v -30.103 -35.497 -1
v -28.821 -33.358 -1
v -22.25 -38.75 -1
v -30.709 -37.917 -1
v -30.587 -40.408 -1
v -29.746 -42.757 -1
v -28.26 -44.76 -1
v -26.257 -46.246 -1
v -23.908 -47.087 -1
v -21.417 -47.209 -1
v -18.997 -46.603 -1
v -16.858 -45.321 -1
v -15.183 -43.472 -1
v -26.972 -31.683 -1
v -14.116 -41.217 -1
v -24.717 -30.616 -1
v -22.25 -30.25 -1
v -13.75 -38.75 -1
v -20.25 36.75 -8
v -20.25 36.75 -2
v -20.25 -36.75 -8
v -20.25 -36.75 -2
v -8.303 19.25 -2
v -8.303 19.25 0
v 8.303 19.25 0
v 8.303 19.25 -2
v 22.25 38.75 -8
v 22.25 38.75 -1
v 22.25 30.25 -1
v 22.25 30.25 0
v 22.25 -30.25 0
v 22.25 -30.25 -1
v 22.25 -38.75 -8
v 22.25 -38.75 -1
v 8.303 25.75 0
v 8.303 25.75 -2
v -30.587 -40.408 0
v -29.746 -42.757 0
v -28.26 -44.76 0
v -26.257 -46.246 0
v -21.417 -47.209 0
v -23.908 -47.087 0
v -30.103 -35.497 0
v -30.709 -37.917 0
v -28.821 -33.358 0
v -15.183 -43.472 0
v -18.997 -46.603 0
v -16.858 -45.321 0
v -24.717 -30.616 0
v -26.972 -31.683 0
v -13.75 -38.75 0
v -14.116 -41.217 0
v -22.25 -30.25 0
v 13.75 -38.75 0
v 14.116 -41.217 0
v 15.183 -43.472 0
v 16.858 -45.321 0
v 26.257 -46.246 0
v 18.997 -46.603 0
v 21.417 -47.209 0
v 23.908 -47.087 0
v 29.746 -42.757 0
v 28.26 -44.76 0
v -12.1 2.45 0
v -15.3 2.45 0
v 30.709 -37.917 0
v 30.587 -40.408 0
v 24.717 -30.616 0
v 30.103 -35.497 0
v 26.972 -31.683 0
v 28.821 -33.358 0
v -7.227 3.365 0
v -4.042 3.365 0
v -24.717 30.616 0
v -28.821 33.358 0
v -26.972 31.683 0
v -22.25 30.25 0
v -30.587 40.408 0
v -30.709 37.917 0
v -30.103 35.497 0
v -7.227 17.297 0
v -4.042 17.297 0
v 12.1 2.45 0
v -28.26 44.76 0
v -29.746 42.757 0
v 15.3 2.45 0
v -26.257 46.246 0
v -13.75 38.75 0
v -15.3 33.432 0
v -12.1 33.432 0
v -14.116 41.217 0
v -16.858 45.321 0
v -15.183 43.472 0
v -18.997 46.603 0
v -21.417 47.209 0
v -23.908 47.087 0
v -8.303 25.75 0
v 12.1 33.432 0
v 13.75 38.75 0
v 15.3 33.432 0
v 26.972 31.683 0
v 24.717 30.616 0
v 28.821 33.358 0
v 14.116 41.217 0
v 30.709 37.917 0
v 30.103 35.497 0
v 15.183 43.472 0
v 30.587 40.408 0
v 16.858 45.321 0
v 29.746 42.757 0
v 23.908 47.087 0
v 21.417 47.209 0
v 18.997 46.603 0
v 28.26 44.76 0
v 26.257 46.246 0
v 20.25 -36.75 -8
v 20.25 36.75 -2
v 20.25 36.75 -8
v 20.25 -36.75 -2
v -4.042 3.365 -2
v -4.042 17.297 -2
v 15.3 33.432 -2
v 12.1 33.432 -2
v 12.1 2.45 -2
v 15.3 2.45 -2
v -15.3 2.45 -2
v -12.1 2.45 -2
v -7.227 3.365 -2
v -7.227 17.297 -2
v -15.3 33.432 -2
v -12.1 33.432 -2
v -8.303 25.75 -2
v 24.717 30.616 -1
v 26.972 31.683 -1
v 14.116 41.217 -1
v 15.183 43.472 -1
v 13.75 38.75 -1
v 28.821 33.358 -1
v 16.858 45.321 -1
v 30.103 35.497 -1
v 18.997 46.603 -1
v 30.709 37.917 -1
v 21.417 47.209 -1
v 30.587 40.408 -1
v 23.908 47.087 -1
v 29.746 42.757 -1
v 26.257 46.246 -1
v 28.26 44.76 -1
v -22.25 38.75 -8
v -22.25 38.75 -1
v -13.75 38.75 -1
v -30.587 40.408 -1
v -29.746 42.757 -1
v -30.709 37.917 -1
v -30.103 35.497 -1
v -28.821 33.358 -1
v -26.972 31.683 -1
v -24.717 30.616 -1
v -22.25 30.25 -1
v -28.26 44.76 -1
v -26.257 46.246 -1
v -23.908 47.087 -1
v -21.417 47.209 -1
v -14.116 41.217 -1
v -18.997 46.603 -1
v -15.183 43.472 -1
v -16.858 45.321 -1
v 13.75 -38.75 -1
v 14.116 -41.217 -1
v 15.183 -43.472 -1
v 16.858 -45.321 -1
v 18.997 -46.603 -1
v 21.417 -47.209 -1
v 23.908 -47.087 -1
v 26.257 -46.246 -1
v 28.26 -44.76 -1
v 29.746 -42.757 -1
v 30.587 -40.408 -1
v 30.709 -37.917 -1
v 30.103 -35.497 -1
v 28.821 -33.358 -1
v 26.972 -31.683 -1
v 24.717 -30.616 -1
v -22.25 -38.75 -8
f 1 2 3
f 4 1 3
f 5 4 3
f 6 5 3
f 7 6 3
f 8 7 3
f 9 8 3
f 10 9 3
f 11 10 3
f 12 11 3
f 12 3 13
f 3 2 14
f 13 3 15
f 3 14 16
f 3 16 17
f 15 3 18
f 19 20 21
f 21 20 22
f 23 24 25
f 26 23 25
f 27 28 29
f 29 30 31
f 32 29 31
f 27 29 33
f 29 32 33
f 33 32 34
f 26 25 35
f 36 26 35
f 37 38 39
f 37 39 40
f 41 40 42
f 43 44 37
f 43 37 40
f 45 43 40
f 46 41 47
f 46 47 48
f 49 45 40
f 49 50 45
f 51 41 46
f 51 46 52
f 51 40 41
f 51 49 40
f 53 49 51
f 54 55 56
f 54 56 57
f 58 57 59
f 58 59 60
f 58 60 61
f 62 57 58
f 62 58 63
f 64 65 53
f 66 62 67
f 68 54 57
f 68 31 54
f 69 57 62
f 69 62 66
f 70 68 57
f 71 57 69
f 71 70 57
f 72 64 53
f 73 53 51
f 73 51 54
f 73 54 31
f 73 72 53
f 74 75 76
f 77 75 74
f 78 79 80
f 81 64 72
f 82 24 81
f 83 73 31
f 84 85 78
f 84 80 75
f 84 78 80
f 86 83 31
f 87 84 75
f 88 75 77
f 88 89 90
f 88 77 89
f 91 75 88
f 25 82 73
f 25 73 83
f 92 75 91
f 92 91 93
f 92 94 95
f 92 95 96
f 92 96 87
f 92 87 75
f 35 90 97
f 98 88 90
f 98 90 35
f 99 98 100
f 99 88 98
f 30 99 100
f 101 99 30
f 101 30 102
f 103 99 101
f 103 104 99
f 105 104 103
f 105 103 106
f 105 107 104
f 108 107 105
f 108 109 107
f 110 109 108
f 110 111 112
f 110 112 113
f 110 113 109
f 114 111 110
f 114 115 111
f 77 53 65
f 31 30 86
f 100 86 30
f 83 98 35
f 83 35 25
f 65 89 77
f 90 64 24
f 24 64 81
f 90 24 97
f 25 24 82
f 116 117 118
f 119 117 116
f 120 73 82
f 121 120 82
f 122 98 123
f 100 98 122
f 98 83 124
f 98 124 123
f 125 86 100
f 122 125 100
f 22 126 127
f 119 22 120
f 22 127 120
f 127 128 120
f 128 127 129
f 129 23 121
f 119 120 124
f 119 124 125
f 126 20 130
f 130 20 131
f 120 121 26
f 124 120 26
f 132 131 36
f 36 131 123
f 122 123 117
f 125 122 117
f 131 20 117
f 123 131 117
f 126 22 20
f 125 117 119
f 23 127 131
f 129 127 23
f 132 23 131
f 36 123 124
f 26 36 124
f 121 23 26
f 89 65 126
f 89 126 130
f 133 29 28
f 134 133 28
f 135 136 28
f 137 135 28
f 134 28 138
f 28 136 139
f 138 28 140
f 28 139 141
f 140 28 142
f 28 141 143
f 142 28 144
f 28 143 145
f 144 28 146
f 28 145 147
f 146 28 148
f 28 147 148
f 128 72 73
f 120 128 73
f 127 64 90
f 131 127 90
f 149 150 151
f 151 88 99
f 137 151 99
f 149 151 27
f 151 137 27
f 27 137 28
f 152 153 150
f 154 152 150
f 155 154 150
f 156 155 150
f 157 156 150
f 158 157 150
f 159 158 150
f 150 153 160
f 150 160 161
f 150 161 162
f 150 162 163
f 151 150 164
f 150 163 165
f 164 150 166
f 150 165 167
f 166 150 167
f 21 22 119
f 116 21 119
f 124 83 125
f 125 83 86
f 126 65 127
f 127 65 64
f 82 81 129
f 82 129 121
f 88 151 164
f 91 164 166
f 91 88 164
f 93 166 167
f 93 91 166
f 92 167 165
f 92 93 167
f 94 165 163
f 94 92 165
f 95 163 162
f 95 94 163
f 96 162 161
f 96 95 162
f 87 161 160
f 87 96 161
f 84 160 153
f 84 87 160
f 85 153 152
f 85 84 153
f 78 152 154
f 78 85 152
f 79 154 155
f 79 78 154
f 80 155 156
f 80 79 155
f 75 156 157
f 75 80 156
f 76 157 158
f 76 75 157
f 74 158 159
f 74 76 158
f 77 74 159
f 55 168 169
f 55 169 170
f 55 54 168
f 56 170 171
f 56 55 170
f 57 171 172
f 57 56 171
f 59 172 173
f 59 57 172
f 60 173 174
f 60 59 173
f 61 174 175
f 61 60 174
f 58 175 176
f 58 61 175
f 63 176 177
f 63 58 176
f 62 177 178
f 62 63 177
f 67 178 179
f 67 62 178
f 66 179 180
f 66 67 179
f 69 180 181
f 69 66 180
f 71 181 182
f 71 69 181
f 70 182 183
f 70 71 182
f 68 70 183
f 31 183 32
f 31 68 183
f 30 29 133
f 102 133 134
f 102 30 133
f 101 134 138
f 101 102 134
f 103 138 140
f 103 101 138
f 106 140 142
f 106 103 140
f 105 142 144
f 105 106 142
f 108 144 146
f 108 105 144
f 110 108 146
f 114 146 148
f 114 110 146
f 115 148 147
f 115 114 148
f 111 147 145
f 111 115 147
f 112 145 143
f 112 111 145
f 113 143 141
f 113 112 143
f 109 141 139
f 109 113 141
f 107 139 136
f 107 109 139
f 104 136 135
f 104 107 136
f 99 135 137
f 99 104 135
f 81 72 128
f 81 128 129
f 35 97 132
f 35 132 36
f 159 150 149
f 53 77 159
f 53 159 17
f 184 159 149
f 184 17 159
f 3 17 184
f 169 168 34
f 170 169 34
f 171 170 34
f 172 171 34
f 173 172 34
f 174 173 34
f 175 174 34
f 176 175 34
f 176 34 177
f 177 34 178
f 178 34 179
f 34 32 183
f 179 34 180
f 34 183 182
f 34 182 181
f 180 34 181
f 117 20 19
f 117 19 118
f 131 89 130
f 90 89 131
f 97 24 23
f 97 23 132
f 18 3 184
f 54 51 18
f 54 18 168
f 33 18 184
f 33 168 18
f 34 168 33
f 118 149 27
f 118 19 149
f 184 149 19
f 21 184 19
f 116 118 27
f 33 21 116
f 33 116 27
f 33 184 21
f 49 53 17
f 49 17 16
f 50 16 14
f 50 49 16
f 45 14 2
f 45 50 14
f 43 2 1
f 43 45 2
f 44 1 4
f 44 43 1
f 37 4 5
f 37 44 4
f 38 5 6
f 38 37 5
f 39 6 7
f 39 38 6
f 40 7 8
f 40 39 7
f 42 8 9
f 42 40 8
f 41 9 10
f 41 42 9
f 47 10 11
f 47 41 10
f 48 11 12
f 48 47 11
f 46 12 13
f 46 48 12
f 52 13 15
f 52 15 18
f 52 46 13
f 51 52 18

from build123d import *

# Parameters (mm, degrees)
F0_W     = 44.5
F0_H     = 77.5
F0_W_2   = 40.5
F0_H_2   = 73.5
F0_W_3   = 34.2
F0_H_3   = 33.5
F0_W_4   = 3.2
F0_H_4   = 30.9815835953
F0_W_5   = 3.1855669804
F0_H_5   = 13.9315482229
F0_W_6   = 16.6057739407
F0_H_6   = 6.5
F1_DEPTH = 2
F2_W     = 44.5
F2_H     = 77.5
F2_W_2   = 40.5
F2_H_2   = 73.5
F3_DEPTH = 6
F4_R     = 8.5
F5_DEPTH = 1


with BuildPart() as f1:
    # F0 (on Top) → F1 (new body)
    with BuildSketch(Plane.XY):
        Rectangle(F0_W, F0_H)
        Rectangle(F0_W_2, F0_H_2, mode=Mode.SUBTRACT)
        Rectangle(F0_W_2, F0_H_2)
        with Locations((0, 17.5)):
            Rectangle(F0_W_3, F0_H_3, mode=Mode.SUBTRACT)
        with Locations((0, 17.5)):
            Rectangle(F0_W_3, F0_H_3)
        with Locations((-13.7, 17.9407917976)):
            Rectangle(F0_W_4, F0_H_4, mode=Mode.SUBTRACT)
        with Locations((-5.6343034375, 10.3312116116)):
            Rectangle(F0_W_5, F0_H_5, mode=Mode.SUBTRACT)
        with Locations((0, 22.5)):
            Rectangle(F0_W_6, F0_H_6, mode=Mode.SUBTRACT)
        with Locations((13.7, 17.9407917976)):
            Rectangle(F0_W_4, F0_H_4, mode=Mode.SUBTRACT)
    extrude(amount=-F1_DEPTH)

    # F2 (on face) → F3 (join)
    with BuildSketch(Plane(origin=(0, 0, -2), x_dir=(1, 0, 0), z_dir=(0, 0, -1))):
        Rectangle(F2_W, F2_H)
        Rectangle(F2_W_2, F2_H_2, mode=Mode.SUBTRACT)
    extrude(amount=F3_DEPTH)

    # F4 (on face) → F5 (join)
    with BuildSketch(Plane.XY):
        with Locations((-22.25, 38.75)):
            Circle(F4_R)
        with Locations((22.25, 38.75)):
            Circle(F4_R)
        with Locations((22.25, -38.75)):
            Circle(F4_R)
        with Locations((-22.25, -38.75)):
            Circle(F4_R)
    extrude(amount=-F5_DEPTH)


solid = f1.part
